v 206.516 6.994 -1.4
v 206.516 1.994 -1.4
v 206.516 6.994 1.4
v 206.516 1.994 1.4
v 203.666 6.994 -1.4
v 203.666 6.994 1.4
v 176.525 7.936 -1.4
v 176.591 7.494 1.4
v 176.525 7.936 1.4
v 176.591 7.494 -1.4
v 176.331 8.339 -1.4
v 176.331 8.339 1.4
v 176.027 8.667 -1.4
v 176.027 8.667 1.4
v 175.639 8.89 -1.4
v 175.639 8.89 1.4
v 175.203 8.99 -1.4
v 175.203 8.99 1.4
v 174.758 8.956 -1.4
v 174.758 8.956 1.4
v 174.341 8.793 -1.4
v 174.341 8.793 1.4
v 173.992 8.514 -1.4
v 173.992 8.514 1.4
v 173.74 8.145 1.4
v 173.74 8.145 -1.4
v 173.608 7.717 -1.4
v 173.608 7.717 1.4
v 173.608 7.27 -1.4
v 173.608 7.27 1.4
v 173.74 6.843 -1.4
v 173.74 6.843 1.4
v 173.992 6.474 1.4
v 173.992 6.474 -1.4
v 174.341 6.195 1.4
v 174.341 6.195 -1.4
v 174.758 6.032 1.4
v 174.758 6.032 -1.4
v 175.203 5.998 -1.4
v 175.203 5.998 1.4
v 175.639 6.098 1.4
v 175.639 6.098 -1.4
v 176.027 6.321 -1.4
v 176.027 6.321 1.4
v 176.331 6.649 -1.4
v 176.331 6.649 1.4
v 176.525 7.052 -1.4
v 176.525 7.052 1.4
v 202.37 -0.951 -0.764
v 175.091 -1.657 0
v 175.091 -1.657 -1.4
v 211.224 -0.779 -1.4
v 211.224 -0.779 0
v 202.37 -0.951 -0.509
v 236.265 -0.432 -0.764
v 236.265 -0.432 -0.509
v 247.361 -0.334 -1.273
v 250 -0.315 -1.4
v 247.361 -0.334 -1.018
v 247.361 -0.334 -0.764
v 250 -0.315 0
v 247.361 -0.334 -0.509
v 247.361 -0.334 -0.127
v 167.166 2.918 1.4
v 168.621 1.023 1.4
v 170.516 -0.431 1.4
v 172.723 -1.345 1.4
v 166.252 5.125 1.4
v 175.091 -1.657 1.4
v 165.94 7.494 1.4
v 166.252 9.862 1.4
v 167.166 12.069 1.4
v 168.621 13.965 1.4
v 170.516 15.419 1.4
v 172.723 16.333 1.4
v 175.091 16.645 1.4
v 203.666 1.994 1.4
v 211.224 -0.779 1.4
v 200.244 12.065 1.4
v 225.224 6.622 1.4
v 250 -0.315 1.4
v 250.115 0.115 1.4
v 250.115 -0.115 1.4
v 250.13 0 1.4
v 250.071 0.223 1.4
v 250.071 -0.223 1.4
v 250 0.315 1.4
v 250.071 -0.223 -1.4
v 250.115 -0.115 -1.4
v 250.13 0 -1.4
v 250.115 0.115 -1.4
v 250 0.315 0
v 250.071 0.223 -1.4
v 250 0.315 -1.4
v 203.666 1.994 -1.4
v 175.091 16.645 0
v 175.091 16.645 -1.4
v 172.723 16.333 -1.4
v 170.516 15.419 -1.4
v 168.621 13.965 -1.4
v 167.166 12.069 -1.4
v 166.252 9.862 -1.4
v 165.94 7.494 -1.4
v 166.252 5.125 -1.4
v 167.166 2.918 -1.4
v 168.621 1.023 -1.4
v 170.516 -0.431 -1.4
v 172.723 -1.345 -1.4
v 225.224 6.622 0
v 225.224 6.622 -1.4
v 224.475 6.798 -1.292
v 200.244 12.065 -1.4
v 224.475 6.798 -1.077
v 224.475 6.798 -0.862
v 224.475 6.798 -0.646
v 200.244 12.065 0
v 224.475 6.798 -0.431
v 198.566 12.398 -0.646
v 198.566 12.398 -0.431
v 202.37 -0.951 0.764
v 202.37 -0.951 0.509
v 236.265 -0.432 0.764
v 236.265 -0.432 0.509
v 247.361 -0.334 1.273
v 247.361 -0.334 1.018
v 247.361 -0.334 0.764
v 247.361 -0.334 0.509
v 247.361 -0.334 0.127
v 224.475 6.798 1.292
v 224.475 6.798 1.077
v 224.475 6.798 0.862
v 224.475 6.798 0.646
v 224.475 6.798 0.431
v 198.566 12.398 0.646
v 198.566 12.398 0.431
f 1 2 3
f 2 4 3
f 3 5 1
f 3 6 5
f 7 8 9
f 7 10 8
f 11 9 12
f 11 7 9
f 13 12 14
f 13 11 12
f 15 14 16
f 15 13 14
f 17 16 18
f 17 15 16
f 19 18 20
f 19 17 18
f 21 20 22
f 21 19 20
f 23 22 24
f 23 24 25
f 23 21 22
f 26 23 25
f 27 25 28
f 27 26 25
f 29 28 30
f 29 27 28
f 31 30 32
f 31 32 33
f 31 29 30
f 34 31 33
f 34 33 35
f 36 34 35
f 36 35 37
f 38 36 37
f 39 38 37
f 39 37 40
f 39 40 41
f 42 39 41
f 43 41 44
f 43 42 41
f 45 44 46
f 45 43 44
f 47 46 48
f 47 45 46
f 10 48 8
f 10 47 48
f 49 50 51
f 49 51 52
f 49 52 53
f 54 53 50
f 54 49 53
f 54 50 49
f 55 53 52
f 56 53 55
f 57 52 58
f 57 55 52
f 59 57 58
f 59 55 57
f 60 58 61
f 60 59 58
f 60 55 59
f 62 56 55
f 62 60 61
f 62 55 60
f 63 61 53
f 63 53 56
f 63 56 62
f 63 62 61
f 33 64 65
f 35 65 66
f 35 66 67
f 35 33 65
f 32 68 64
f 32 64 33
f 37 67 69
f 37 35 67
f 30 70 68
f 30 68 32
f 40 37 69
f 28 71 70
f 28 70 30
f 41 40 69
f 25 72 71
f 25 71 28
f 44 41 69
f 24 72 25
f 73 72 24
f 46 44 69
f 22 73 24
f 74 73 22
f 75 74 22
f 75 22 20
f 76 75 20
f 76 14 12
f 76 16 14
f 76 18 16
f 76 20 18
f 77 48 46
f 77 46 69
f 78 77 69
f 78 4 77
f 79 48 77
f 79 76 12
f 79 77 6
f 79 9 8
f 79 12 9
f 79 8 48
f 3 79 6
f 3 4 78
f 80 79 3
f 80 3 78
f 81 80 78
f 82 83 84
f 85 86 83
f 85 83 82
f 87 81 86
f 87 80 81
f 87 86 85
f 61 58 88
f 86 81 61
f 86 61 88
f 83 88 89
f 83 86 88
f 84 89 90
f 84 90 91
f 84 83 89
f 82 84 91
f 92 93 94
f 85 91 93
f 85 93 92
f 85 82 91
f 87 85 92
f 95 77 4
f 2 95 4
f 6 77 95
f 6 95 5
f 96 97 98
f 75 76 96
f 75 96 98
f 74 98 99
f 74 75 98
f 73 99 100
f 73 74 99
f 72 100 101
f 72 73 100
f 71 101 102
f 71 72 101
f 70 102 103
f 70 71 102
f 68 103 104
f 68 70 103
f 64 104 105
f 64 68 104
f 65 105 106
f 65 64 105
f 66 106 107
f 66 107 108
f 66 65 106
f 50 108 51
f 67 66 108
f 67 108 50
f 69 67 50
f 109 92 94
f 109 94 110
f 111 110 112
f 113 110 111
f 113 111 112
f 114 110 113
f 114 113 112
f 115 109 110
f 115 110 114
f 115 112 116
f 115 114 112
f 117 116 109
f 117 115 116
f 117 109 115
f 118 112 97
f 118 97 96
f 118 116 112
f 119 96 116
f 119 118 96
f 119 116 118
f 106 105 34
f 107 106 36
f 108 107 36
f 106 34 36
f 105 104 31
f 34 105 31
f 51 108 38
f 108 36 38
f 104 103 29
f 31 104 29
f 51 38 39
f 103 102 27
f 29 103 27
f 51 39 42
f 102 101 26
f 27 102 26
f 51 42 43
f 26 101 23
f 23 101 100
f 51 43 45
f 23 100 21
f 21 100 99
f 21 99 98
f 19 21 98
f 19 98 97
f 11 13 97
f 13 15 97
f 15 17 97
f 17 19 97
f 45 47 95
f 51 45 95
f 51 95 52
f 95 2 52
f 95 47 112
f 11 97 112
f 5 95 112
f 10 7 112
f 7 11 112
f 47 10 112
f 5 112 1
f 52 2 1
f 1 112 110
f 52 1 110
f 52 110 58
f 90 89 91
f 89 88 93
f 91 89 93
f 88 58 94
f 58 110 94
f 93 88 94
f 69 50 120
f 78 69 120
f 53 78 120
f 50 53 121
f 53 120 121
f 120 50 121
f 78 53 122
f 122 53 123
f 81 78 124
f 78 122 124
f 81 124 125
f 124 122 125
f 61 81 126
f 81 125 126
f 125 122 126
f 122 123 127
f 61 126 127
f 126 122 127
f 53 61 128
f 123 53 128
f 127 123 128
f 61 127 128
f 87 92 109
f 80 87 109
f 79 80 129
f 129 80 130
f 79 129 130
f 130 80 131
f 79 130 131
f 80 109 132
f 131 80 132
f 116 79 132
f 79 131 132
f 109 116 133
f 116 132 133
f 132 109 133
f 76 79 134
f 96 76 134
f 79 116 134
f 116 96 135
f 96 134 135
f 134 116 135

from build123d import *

# Parameters (mm, degrees)
SKETCH_1_R      = 1.5
SKETCH_1_W      = 2.85
SKETCH_1_H      = 5
EXTRUDE_1_DEPTH = 1.4


with BuildPart() as part:
    # Эскиз1 → Бобышка-Вытянуть1 (new, symmetric)
    with BuildSketch(Plane.XY):
        with BuildLine():
            ThreePointArc((175.091334091, 16.644787515), (168.620686799, 13.96455765), (165.940456932, 7.493910359))
            ThreePointArc((165.940456932, 7.493910359), (168.620686797, 1.023263065), (175.091334091, -1.656966802))
            add(Edge.make_bspline(
                [(175.091334091, -1.656966802), (177.330680613, -1.588466601), (181.854695323, -1.455127256), (188.663234462, -1.270383377), (195.516645168, -1.101112884), (202.369532894, -0.948617189), (211.49919029, -0.767742353), (220.603098666, -0.619939742), (229.617630172, -0.50292618), (236.087353854, -0.431514192), (241.980776913, -0.376520461), (246.558970011, -0.339535886), (249.120490965, -0.321271242), (250, -0.315)],
                knots=[0.704401069, 0.704401069, 0.704401069, 0.704401069, 0.730918775, 0.757971338, 0.785017763, 0.812061651, 0.839103366, 0.893099152, 0.919831065, 0.945809917, 0.969680601, 0.989589706, 1, 1, 1, 1], degree=3))
            ThreePointArc((250, -0.315), (250.130477272, 0), (250, 0.315))
            add(Edge.make_bspline(
                [(250, 0.315), (249.15566774, 0.545019818), (246.720175698, 1.208516243), (242.391332083, 2.358339053), (236.849761204, 3.787625364), (230.779918279, 5.298008837), (224.455917947, 6.812866028), (218.030543496, 8.291610632), (211.562405045, 9.719735057), (205.072411509, 11.092374932), (198.567970913, 12.407850726), (192.052369914, 13.665297924), (185.527619973, 14.864093303), (179.872800983, 15.850364437), (176.392239334, 16.431323122), (175.091334091, 16.644787515)],
                knots=[0, 0, 0, 0, 0.0101622, 0.029313053, 0.052011605, 0.076619468, 0.101948061, 0.127526132, 0.153184131, 0.178867888, 0.204557903, 0.230245712, 0.255925967, 0.281594302, 0.296903142, 0.296903142, 0.296903142, 0.296903142], degree=3))
        make_face()
        with Locations((175.091334091, 7.493910357)):
            Circle(SKETCH_1_R, mode=Mode.SUBTRACT)
        with Locations((205.091334091, 4.493910357)):
            Rectangle(SKETCH_1_W, SKETCH_1_H, mode=Mode.SUBTRACT)
    extrude(amount=EXTRUDE_1_DEPTH, both=True)


solid = part.part
